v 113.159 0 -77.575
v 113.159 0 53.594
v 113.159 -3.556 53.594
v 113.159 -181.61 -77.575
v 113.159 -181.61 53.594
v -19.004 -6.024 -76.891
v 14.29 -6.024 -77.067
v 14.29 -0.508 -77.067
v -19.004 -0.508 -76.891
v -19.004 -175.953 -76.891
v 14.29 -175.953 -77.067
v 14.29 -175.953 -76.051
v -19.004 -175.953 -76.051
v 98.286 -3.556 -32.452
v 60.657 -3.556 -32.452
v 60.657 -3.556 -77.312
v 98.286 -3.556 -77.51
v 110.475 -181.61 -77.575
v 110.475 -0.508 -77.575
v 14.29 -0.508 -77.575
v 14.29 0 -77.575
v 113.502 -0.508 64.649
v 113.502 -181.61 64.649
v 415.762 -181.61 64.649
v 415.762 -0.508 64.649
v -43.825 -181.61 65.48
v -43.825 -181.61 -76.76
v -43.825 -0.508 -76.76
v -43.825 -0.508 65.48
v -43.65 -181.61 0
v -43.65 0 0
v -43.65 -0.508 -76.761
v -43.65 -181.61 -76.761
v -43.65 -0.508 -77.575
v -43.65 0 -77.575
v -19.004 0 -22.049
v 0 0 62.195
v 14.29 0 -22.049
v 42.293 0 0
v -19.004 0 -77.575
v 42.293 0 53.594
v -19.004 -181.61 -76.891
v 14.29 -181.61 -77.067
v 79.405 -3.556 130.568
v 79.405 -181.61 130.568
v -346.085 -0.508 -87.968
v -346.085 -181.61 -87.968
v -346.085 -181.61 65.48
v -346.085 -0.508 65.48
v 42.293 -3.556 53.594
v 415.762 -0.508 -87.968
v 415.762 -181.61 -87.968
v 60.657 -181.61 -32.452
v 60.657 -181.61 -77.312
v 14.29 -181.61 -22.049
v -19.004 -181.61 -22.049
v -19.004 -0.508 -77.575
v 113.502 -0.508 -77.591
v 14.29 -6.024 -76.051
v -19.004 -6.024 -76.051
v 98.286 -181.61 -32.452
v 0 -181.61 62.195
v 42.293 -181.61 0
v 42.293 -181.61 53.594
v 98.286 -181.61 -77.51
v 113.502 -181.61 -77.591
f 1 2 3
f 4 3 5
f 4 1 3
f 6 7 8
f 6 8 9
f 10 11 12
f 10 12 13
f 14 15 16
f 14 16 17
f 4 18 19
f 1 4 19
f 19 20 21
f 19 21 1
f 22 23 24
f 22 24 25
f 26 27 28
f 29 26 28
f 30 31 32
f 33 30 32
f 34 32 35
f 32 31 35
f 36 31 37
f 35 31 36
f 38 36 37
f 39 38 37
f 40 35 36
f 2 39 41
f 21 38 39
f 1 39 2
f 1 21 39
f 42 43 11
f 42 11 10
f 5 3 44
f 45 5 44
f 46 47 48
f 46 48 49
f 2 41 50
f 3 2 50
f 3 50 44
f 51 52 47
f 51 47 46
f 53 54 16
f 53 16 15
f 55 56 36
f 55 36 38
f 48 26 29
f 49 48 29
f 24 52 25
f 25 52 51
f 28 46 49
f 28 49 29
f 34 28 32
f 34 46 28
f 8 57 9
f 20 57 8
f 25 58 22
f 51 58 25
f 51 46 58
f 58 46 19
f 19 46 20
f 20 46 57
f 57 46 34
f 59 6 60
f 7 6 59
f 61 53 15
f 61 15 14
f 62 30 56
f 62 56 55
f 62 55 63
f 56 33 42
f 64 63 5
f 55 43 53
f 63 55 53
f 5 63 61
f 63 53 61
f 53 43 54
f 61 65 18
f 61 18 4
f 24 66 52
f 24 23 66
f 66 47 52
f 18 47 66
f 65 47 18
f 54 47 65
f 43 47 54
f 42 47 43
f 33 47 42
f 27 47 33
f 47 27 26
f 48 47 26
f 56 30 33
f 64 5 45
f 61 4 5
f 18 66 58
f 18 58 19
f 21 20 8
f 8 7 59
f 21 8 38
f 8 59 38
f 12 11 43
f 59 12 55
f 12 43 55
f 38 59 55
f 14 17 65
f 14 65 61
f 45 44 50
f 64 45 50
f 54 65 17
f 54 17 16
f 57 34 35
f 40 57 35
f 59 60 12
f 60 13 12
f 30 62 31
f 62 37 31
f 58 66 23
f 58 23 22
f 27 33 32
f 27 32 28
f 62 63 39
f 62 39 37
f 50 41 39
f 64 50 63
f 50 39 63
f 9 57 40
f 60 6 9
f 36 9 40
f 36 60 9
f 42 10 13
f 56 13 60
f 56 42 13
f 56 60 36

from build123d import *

# Parameters (mm, degrees)
F1_DEPTH  = 25.4
F2_DEPTH  = 105.41
F4_DEPTH  = 25.4
F7_DEPTH  = 34.544
F8_DEPTH  = 25.4
F9_W      = 33.2944607362
F9_H      = 55.5258449167
F10_DEPTH = 25.4
F11_DEPTH = 249.682
F12_W     = 53.8298841566
F12_H     = 169.9287788942
F12_W_2   = 19.2790124565
F13_DEPTH = 1.524
F14_DEPTH = 70.866
F16_W     = 37.628442049
F16_H     = 45.0919307768
F17_DEPTH = 178.054
F18_DEPTH = 53.594
F20_DEPTH = 178.054
F22_DEPTH = 181.102
F23_DEPTH = 302.26
F24_DEPTH = 302.26
F25_DEPTH = 142.24
F26_DEPTH = 142.24


with BuildPart() as f1:
    # F0 (on Front) → F1 (new body)
    with BuildSketch(Plane.XZ):
        Polygon((-43.6498820782, -77.5746703148), (42.2929041088, -77.5746703148), (42.2929041088, 0), (0, 62.1954351664), (-43.6498820782, 0), align=None)
    extrude(amount=F1_DEPTH)

    # F2 (add): a face of the model
    f2_faces = [f1.faces().sort_by_distance(p)[0] for p in [
        (-0.6137701258, -25.4, -21.7553212645),
    ]]
    extrude(f2_faces, amount=F2_DEPTH)

    # F3 (on face) → F4 (join)
    with BuildSketch(Plane.XZ.offset(130.81)):
        Polygon((-43.6498820782, 0), (-43.6498820782, -77.5746703148), (42.2929041088, -77.5746703148), (42.2929041088, 0), (0, 62.1954351664), align=None)
    extrude(amount=F4_DEPTH)

    # F6 (on face) → F7 (join)
    with BuildSketch(Plane.XZ.offset(156.21)):
        Polygon((-16.9418714941, -35.6023237109), (-16.9418714941, -77.5746703148), (13.7008177117, -77.5746703148), (13.7008177117, -37.0755307376), (13.7008177117, -35.6023237109), align=None)
    extrude(amount=-F7_DEPTH)

    # F5 (on face) → F8 (join)
    with BuildSketch(Plane.XZ.offset(156.21)):
        Polygon((-17.8257934749, -77.5746703148), (13.7008177117, -77.5746703148), (42.2929041088, -77.5746703148), (42.2929041088, 0), (0, 62.1954351664), (-43.6498820782, 0), (-43.6498820782, -77.5746703148), align=None)
    extrude(amount=F8_DEPTH)

    # F9 (on face) → F10 (join)
    with BuildSketch(Plane.XZ.offset(181.61)):
        with Locations((-2.3571313359, -49.8117478564)):
            Rectangle(F9_W, F9_H)
    extrude(amount=F10_DEPTH)

    # F11 (cut): a face of the model
    f11_faces = [f1.faces().sort_by_distance(p)[0] for p in [
        (-2.3571313359, -207.01, -49.8117478564),
    ]]
    extrude(f11_faces, amount=-F11_DEPTH, mode=Mode.SUBTRACT)

    # F12 (on face) → F13 (join)
    with BuildSketch(Plane(origin=(0, 0, -77.5746703148), x_dir=(1, 0, 0), z_dir=(0, 0, -1))):
        with Locations((7.9105803743, 90.9883729182)):
            Rectangle(F12_W, F12_H)
        with Locations((-28.6438679323, 90.9883729182)):
            Rectangle(F12_W_2, F12_H)
    extrude(amount=-F13_DEPTH)

    # F14 (add): a face of the model
    f14_faces = [f1.faces().sort_by_distance(p)[0] for p in [
        (42.2929041088, -90.805, -38.7873351574),
    ]]
    extrude(f14_faces, amount=F14_DEPTH)

    # F16 (on face) → F17 (cut)
    with BuildSketch(Plane.XZ.offset(181.61)):
        with Locations((79.4716104865, -54.9975987524)):
            Rectangle(F16_W, F16_H)
    extrude(amount=-F17_DEPTH, mode=Mode.SUBTRACT)

    # F18 (add): a face of the model
    f18_faces = [f1.faces().sort_by_distance(p)[0] for p in [
        (77.7259041088, -90.805, 0),
    ]]
    extrude(f18_faces, amount=F18_DEPTH)

    # F19 (on face) → F20 (join)
    with BuildSketch(Plane.XZ.offset(181.61)):
        Polygon((79.4050395489, 130.5681169033), (42.2929041088, 53.594), (113.1589041088, 53.594), align=None)
    extrude(amount=-F20_DEPTH)

    # F21 (on face) → F22 (join)
    with BuildSketch(Plane.XZ.offset(181.61)):
        Polygon((-43.6498820782, -76.761349558), (-43.8248664141, -76.7604261637), (-43.8248664141, -87.9684388638), (113.5024726391, -87.9684388638), (113.5024726391, -77.5906443596), (42.2929041088, -77.2148706392), (42.2929041088, -77.5746703148), (14.2900990322, -77.5746703148), (14.2900990322, -77.0670995115), (-19.004361704, -76.8914042554), (-19.004361704, -77.5746703148), (-43.6498820782, -77.5746703148), align=None)
    extrude(amount=-F22_DEPTH)

    # F23 (add): a face of the model
    f23_faces = [f1.faces().sort_by_distance(p)[0] for p in [
        (-43.8248664141, -91.059, -82.3644325137),
    ]]
    extrude(f23_faces, amount=F23_DEPTH)

    # F24 (add): a face of the model
    f24_faces = [f1.faces().sort_by_distance(p)[0] for p in [
        (113.5024726391, -91.059, -82.7795416117),
    ]]
    extrude(f24_faces, amount=F24_DEPTH)

    # F25 (add): a face of the model
    f25_faces = [f1.faces().sort_by_distance(p)[0] for p in [
        (-194.9548664141, -91.059, -76.7604261637),
    ]]
    extrude(f25_faces, amount=F25_DEPTH)

    # F26 (add): a face of the model
    f26_faces = [f1.faces().sort_by_distance(p)[0] for p in [
        (264.6324726391, -91.059, -77.5906443596),
    ]]
    extrude(f26_faces, amount=F26_DEPTH)


solid = f1.part
